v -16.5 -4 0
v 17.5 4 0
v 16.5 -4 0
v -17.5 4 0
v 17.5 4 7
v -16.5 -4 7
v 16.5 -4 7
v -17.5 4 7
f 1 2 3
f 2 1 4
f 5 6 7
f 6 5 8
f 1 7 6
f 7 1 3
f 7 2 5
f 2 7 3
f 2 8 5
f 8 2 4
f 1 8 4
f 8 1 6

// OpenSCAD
// Rectangular shaft key with chamfered ends.
$fn = 60;
eps = 0.02;
key_w = 8;
key_h = 7;
key_l = 35;
chamfer = 1;
polyhedron(points = [
    [-key_l / 2 + chamfer, -key_w / 2, 0], [key_l / 2 - chamfer, -key_w / 2, 0], [key_l / 2, key_w / 2, 0], [-key_l / 2, key_w / 2, 0],
    [-key_l / 2 + chamfer, -key_w / 2, key_h], [key_l / 2 - chamfer, -key_w / 2, key_h], [key_l / 2, key_w / 2, key_h], [-key_l / 2, key_w / 2, key_h]
], faces = [[0,1,2,3],[4,7,6,5],[0,4,5,1],[1,5,6,2],[2,6,7,3],[3,7,4,0]]);
